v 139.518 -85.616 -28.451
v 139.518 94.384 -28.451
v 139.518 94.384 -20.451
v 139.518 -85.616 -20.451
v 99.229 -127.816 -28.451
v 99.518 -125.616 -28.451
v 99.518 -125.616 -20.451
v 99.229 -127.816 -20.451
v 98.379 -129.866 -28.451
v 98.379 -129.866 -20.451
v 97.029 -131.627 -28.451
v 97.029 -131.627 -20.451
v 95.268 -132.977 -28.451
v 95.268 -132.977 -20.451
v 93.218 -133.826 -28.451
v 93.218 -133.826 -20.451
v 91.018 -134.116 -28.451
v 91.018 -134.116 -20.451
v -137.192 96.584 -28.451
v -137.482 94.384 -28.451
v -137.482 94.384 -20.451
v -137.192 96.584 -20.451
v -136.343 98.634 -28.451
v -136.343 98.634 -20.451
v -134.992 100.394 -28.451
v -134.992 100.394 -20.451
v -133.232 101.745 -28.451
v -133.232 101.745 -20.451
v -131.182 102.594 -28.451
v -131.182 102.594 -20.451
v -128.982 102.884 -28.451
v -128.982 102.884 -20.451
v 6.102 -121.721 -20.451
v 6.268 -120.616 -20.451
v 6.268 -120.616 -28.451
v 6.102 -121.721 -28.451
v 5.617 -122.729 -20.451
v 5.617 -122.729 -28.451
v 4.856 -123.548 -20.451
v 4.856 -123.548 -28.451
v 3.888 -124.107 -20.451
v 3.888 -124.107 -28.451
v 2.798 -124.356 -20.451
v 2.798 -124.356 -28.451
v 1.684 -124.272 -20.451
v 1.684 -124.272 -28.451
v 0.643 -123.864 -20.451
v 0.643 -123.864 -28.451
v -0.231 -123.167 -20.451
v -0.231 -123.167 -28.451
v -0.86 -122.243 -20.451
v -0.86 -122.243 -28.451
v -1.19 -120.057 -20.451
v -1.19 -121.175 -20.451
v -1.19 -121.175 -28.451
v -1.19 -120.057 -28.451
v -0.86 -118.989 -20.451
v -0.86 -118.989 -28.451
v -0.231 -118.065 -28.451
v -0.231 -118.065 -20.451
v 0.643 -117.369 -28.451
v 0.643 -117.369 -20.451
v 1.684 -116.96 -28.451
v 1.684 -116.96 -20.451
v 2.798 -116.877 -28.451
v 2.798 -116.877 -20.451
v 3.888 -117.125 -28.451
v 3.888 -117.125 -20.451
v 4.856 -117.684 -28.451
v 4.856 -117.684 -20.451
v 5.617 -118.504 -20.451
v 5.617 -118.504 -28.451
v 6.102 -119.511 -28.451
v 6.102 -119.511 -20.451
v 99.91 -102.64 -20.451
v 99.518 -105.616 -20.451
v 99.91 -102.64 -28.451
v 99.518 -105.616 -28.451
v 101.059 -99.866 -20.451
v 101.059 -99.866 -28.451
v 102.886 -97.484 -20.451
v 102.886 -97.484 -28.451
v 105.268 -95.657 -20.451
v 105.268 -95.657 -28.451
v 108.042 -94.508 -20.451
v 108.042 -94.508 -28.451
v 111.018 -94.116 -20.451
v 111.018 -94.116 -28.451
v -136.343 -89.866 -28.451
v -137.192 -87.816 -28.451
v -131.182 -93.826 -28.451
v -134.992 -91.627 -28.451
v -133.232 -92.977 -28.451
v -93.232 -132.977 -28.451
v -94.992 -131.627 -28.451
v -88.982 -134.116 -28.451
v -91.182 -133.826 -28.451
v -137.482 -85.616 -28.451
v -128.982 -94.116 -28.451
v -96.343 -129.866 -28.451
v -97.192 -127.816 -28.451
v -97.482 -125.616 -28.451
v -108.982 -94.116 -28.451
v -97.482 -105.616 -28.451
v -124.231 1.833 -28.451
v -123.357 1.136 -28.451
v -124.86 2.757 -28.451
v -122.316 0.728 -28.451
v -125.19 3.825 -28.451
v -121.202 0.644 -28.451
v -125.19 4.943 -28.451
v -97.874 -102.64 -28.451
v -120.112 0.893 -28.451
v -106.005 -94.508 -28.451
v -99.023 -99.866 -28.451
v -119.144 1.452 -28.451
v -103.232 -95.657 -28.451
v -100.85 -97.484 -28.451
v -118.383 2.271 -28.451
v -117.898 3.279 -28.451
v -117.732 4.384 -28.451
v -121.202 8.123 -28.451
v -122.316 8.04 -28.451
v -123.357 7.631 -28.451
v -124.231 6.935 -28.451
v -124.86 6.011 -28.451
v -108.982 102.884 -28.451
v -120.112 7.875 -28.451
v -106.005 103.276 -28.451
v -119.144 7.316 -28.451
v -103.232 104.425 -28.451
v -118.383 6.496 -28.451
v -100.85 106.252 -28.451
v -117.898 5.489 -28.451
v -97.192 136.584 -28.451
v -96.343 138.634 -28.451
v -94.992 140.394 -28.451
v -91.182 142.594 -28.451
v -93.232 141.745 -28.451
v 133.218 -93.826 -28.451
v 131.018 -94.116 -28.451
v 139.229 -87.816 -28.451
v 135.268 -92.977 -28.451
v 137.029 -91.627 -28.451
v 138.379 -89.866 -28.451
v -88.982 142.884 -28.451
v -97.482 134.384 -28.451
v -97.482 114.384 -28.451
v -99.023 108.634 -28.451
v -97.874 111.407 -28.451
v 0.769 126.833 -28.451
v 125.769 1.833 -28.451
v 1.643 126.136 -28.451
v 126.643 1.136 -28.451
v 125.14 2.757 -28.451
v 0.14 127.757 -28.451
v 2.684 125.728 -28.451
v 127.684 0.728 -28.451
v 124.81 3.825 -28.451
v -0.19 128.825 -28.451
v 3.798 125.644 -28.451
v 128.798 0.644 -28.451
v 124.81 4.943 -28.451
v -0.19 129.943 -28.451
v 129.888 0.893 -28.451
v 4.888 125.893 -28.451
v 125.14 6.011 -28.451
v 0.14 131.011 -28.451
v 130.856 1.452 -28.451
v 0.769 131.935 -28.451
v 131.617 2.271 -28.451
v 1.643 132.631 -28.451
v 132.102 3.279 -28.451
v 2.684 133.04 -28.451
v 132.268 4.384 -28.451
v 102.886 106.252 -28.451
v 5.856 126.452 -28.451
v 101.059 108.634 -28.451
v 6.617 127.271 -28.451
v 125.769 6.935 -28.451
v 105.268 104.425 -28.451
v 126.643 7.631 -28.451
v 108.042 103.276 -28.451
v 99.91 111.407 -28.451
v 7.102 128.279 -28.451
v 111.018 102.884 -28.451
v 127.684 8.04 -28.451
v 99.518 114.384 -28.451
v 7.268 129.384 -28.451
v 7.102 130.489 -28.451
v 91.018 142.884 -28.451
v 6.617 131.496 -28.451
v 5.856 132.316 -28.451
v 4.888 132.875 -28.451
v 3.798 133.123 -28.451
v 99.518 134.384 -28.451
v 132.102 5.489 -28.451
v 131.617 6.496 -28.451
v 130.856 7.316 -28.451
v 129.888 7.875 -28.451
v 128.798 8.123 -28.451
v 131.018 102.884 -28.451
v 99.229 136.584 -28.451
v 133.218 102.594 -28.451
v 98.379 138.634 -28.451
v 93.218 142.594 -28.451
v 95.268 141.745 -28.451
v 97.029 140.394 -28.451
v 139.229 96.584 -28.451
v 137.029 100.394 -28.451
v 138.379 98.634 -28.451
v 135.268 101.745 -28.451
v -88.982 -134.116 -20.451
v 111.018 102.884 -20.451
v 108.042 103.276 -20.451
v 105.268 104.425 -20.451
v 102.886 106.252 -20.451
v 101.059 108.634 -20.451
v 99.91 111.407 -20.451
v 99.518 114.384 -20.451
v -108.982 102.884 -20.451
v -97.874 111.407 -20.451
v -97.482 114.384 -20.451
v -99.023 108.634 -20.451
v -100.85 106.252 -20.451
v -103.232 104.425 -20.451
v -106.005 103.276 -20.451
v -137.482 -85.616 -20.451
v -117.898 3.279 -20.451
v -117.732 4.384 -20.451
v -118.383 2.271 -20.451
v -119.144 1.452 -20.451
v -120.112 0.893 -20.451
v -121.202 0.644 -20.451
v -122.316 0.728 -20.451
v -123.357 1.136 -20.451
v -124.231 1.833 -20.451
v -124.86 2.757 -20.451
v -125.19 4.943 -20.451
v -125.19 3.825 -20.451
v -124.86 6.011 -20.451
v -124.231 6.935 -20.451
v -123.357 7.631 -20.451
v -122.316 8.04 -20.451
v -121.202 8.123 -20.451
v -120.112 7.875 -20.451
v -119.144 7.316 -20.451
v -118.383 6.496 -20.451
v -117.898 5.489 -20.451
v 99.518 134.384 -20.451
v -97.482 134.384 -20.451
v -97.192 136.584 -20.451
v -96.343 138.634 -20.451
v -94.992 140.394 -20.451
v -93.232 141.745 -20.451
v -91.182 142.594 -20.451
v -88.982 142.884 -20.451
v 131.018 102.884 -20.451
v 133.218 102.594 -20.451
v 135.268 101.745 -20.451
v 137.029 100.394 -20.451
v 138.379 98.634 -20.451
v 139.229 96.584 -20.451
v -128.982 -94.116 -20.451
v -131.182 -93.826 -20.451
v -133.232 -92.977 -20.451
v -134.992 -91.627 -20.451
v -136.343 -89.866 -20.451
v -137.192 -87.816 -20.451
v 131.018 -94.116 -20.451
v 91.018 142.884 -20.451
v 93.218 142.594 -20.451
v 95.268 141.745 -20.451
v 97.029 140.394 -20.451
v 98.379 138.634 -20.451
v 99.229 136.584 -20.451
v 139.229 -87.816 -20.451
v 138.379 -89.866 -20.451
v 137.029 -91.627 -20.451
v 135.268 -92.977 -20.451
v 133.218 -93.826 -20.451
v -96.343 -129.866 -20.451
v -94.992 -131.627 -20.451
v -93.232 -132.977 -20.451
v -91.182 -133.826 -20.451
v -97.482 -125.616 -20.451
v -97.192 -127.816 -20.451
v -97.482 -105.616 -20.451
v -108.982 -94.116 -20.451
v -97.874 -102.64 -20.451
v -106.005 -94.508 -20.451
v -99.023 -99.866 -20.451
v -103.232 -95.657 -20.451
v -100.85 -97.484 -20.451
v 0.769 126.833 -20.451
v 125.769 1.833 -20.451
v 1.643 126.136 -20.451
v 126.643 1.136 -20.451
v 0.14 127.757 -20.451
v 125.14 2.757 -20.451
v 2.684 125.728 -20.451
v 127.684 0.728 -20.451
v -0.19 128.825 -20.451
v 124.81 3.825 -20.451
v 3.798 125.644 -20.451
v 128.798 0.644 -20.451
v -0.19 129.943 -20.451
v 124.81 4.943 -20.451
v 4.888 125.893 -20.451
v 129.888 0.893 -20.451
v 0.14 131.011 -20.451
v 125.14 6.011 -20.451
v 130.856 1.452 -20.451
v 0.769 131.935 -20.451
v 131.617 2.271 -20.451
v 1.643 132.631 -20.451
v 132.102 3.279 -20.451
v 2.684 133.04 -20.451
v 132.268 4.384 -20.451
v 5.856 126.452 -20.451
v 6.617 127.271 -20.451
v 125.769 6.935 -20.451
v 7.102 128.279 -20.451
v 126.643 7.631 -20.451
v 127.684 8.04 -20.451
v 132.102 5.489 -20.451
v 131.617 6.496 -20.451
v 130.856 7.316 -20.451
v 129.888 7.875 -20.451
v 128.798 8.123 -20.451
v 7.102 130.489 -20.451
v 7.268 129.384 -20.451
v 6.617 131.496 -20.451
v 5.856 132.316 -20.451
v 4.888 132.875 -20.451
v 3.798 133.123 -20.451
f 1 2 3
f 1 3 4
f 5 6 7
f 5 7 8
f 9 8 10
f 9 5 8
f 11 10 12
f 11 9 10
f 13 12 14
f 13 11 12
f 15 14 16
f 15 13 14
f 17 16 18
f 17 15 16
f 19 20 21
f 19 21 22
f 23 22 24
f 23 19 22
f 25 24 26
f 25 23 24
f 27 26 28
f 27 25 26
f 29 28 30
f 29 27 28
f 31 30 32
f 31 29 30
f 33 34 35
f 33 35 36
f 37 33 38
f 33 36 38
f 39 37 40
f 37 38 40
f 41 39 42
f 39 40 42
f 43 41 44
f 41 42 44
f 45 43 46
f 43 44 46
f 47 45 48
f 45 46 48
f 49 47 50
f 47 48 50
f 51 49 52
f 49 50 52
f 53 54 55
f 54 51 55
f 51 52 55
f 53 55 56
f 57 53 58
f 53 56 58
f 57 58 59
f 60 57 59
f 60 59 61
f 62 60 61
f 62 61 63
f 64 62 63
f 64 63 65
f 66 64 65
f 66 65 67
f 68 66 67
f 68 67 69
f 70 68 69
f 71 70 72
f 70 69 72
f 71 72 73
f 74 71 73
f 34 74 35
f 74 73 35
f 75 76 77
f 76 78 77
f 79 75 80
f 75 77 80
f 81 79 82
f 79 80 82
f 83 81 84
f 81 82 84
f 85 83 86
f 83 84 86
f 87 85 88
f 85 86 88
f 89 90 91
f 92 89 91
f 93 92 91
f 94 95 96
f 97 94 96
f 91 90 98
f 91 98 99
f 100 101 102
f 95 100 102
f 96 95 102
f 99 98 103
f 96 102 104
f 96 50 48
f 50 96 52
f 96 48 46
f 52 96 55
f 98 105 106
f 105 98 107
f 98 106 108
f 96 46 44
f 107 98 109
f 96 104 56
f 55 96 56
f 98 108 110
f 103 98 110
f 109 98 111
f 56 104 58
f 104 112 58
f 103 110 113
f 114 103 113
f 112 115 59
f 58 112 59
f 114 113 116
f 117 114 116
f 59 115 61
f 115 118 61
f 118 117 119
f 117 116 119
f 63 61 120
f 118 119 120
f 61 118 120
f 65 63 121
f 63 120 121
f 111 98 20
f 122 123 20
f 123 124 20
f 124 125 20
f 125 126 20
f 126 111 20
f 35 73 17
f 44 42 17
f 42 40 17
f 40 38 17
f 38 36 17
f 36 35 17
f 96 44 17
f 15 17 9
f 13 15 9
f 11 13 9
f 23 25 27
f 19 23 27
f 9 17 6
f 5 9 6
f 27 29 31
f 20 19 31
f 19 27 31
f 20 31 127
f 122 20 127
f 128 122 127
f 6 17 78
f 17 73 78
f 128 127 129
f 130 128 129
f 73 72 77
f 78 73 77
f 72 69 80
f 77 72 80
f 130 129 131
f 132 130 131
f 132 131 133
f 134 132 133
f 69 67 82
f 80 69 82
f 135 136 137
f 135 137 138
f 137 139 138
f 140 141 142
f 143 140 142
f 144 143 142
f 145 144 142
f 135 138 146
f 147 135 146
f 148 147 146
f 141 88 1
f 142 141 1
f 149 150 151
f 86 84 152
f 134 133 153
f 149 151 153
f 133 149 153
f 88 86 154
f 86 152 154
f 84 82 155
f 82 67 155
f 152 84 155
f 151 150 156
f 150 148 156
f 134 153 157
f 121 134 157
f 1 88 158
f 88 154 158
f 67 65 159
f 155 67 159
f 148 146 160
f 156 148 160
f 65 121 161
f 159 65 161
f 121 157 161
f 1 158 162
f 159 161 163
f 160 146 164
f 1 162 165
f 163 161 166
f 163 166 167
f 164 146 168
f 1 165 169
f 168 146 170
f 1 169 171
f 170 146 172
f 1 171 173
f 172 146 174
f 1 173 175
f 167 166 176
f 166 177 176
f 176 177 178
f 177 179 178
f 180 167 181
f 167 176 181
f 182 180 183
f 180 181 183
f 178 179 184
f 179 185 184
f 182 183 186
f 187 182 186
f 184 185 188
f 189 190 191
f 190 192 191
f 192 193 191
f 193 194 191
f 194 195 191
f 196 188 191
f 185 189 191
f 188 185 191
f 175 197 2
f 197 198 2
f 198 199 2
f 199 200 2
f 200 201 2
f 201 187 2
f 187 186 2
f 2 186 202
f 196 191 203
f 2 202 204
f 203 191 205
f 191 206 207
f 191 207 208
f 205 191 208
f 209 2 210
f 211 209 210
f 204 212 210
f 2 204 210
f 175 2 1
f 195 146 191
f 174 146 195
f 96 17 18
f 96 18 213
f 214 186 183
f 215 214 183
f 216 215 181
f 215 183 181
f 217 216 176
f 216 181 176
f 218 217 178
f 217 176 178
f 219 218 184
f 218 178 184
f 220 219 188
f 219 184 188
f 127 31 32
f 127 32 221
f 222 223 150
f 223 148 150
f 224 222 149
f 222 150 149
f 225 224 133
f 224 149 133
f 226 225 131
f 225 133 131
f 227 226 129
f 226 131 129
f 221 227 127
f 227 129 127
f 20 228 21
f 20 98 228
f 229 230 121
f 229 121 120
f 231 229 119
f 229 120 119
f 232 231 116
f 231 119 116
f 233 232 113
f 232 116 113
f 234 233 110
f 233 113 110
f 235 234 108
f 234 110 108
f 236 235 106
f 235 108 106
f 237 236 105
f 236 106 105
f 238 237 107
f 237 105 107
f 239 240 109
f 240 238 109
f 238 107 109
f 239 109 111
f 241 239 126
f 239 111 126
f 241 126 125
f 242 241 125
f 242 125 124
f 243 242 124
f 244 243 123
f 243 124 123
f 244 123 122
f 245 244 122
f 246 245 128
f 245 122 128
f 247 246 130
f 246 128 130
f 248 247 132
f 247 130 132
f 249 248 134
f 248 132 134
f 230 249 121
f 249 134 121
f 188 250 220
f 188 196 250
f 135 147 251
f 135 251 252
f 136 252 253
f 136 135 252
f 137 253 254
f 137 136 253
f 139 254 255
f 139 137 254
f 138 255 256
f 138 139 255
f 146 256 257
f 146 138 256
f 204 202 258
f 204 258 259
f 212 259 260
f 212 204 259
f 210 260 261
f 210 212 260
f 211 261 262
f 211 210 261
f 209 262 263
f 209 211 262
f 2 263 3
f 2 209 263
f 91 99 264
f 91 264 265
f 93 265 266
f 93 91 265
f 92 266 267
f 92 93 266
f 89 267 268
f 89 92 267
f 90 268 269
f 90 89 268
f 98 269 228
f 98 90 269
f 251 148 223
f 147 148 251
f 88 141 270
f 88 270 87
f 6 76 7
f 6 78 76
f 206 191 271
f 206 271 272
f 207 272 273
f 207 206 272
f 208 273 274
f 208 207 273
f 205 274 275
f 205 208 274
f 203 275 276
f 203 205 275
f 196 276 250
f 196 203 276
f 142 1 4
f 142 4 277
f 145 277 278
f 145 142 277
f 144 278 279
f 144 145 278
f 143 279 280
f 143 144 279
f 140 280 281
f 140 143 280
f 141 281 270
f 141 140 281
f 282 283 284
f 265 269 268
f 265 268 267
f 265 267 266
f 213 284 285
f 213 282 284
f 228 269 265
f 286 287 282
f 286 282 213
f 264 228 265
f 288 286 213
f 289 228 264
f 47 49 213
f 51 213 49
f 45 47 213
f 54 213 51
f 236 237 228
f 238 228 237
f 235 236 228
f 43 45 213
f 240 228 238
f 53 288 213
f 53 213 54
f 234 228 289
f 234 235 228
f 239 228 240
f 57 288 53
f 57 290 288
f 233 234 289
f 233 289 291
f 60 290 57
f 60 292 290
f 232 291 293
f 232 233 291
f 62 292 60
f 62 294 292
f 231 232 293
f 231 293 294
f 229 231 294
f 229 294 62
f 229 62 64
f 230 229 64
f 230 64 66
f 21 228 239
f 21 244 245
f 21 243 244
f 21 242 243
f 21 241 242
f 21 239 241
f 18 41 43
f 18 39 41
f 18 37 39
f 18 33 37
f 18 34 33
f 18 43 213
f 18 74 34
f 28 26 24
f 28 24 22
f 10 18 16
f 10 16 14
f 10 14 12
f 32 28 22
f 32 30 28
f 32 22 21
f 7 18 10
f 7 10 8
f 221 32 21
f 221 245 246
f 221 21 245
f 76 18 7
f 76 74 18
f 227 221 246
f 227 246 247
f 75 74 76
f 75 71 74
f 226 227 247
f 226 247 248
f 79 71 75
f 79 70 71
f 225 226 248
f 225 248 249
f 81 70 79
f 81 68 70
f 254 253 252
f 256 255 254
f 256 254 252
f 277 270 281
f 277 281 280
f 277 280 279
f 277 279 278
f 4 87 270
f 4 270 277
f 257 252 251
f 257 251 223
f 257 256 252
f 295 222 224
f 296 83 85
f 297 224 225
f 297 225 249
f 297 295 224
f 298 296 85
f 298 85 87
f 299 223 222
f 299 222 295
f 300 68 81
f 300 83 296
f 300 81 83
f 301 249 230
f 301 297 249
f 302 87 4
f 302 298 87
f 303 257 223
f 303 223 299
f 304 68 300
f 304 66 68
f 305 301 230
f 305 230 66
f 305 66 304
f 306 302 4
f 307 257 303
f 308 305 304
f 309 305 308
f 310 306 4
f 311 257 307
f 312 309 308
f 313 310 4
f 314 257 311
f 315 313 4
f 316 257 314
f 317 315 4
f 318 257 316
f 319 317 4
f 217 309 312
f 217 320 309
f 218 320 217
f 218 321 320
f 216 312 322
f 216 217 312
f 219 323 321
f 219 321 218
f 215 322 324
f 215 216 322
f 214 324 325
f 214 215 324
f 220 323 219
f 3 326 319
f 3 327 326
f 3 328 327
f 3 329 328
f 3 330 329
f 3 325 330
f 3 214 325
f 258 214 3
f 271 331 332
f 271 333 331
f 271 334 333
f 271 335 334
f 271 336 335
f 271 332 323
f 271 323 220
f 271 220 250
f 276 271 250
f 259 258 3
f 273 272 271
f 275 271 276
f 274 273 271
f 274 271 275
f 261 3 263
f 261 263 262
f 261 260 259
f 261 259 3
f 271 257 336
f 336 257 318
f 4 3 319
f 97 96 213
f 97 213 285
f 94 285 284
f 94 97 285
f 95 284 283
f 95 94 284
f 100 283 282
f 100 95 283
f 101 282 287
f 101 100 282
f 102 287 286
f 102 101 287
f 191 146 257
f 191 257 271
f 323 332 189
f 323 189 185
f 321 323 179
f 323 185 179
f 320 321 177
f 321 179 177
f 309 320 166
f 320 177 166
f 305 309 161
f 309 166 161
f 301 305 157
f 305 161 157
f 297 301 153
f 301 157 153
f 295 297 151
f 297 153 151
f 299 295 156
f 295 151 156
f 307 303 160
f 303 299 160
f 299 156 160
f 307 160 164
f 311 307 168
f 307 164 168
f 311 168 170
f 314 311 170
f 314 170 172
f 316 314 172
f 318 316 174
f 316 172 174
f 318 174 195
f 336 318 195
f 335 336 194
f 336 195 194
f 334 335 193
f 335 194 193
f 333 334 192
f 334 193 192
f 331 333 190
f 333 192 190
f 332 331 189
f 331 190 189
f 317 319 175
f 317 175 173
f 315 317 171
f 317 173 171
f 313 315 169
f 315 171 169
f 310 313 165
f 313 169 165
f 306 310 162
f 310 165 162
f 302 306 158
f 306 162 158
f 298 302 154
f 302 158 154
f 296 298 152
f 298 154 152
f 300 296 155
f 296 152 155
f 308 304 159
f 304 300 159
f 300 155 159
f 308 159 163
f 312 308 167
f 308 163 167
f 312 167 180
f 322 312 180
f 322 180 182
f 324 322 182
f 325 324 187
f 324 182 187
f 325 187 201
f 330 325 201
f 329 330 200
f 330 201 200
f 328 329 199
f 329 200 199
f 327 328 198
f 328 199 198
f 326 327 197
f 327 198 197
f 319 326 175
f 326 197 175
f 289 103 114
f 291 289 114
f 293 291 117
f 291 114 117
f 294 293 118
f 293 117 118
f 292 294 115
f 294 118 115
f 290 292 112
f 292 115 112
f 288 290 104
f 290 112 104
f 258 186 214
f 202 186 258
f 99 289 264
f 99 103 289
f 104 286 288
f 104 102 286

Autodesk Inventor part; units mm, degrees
ref_plane "YZ Plane" through (0, 0, 0) normal (1, 0, 0) x (0, 1, 0)
ref_plane "XZ Plane" through (0, 0, 0) normal (0, 1, 0) x (-1, 0, 0)
ref_plane "Work Plane1" through (1.0182, 4.3839, -28.4508) normal (0, 0, 1) x (1, 0, 0)
sketch "Sketch4" plane through (1.0182, 4.3839, -28.4508) normal (0, 0, 1) x (1, 0, 0)
  arc A0 (100, 130) -> (90, 140) centre (90, 130) ccw construction
  line L0 (-90, 140) -> (90, 140) construction
  arc A1 (-90, 140) -> (-100, 130) centre (-90, 130) ccw construction
  line L1 (-100, 110) -> (-100, 130) construction
  arc A2 (-110, 100) -> (-100, 110) centre (-110, 110) ccw construction
  line L2 (-130, 100) -> (-110, 100) construction
  arc A3 (-130, 100) -> (-140, 90) centre (-130, 90) ccw construction
  line L3 (-140, -90) -> (-140, 90) construction
  arc A4 (-140, -90) -> (-130, -100) centre (-130, -90) ccw construction
  line L4 (-110, -100) -> (-130, -100) construction
  arc A5 (-100, -110) -> (-110, -100) centre (-110, -110) ccw construction
  line L5 (-100, -130) -> (-100, -110) construction
  arc A6 (-100, -130) -> (-90, -140) centre (-90, -130) ccw construction
  line L6 (90, -140) -> (-90, -140) construction
  arc A7 (90, -140) -> (100, -130) centre (90, -130) ccw construction
  line L7 (100, -110) -> (100, -130) construction
  arc A8 (110, -100) -> (100, -110) centre (110, -110) ccw construction
  line L8 (130, -100) -> (110, -100) construction
  arc A9 (130, -100) -> (140, -90) centre (130, -90) ccw construction
  line L9 (140, 90) -> (140, -90) construction
  arc A10 (140, 90) -> (130, 100) centre (130, 90) ccw construction
  line L10 (110, 100) -> (130, 100) construction
  arc A11 (100, 110) -> (110, 100) centre (110, 110) ccw construction
  line L11 (100, 130) -> (100, 110) construction
  circle A12 centre (0, 125) radius 3.75 construction
  circle A13 centre (0, -125) radius 3.75 construction
  circle A14 centre (-125, 0) radius 3.75 construction
  circle A15 centre (125, 0) radius 3.75 construction
  arc A16 (98.5, 130) -> (90, 138.5) centre (90, 130) ccw
  line L12 (98.5, 130) -> (98.5, 110)
  arc A17 (98.5, 110) -> (110, 98.5) centre (110, 110) ccw
  line L13 (110, 98.5) -> (130, 98.5)
  arc A18 (138.5, 90) -> (130, 98.5) centre (130, 90) ccw
  line L14 (138.5, 90) -> (138.5, -90)
  arc A19 (130, -98.5) -> (138.5, -90) centre (130, -90) ccw
  line L15 (130, -98.5) -> (110, -98.5)
  arc A20 (110, -98.5) -> (98.5, -110) centre (110, -110) ccw
  line L16 (98.5, -110) -> (98.5, -130)
  arc A21 (90, -138.5) -> (98.5, -130) centre (90, -130) ccw
  line L17 (90, -138.5) -> (-90, -138.5)
  arc A22 (-98.5, -130) -> (-90, -138.5) centre (-90, -130) ccw
  line L18 (-98.5, -130) -> (-98.5, -110)
  arc A23 (-98.5, -110) -> (-110, -98.5) centre (-110, -110) ccw
  line L19 (-110, -98.5) -> (-130, -98.5)
  arc A24 (-138.5, -90) -> (-130, -98.5) centre (-130, -90) ccw
  line L20 (-138.5, -90) -> (-138.5, 90)
  arc A25 (-130, 98.5) -> (-138.5, 90) centre (-130, 90) ccw
  line L21 (-130, 98.5) -> (-110, 98.5)
  arc A26 (-110, 98.5) -> (-98.5, 110) centre (-110, 110) ccw
  line L22 (-98.5, 110) -> (-98.5, 130)
  arc A27 (-90, 138.5) -> (-98.5, 130) centre (-90, 130) ccw
  line L23 (-90, 138.5) -> (90, 138.5)
  line L24 (-125, 0) -> (-113.2017, 0)
  circle A28 centre (2.5, 125) radius 3.75
  circle A29 centre (-122.5, 0) radius 3.75
  circle A30 centre (127.5, 0) radius 3.75
  circle A31 centre (1.5, -125) radius 3.75
  point P0 (-1.0182, -4.3839)
  dimension "d21" = 1.5
  dimension "d22" = 2.5
  dimension "d23" = 2.5
  dimension "d24" = 2.5
  dimension "d25" = 1.5
  dimension "d26" = 7.5
  dimension "d27" = 7.5
  dimension "d28" = 7.5
  dimension "d29" = 7.5
  dimension "d30" = 7.5
extrude "Extrusion3" add sketch "Sketch4" along normal blind 8
sketch "Sketch6" plane through (1.0182, 4.3839, -20.4508) normal (0, 0, 1) x (1, 0, 0)
  arc A0 (98.5, 130) -> (90, 138.5) centre (90, 130) ccw projected
  line L0 (90, 138.5) -> (-90, 138.5) projected
  arc A1 (-90, 138.5) -> (-98.5, 130) centre (-90, 130) ccw projected
  line L1 (-98.5, 130) -> (-98.5, 110) projected
  arc A2 (-110, 98.5) -> (-98.5, 110) centre (-110, 110) ccw projected
  line L2 (-110, 98.5) -> (-130, 98.5) projected
  arc A3 (-130, 98.5) -> (-138.5, 90) centre (-130, 90) ccw projected
  line L3 (-138.5, 90) -> (-138.5, -90) projected
  arc A4 (-138.5, -90) -> (-130, -98.5) centre (-130, -90) ccw projected
  line L4 (-130, -98.5) -> (-110, -98.5) projected
  arc A5 (-98.5, -110) -> (-110, -98.5) centre (-110, -110) ccw projected
  line L5 (-98.5, -110) -> (-98.5, -130) projected
  arc A6 (-98.5, -130) -> (-90, -138.5) centre (-90, -130) ccw projected
  line L6 (-90, -138.5) -> (90, -138.5) projected
  arc A7 (90, -138.5) -> (98.5, -130) centre (90, -130) ccw projected
  line L7 (98.5, -130) -> (98.5, -110) projected
  arc A8 (110, -98.5) -> (98.5, -110) centre (110, -110) ccw projected
  line L8 (110, -98.5) -> (130, -98.5) projected
  arc A9 (130, -98.5) -> (138.5, -90) centre (130, -90) ccw projected
  line L9 (138.5, -90) -> (138.5, 90) projected
  arc A10 (138.5, 90) -> (130, 98.5) centre (130, 90) ccw projected
  line L10 (130, 98.5) -> (110, 98.5) projected
  arc A11 (98.5, 110) -> (110, 98.5) centre (110, 110) ccw projected
  line L11 (98.5, 110) -> (98.5, 130) projected
  circle A12 centre (1.5, -125) radius 3.75 projected
  circle A13 centre (127.5, 0) radius 3.75 projected
  circle A14 centre (-122.5, 0) radius 3.75 projected
  circle A15 centre (2.5, 125) radius 3.75 projected
  point P0 (-1.0182, -4.3839)
equation "\"d27\" = d26"
equation "\"d28\" = d27"
equation "\"d29\" = d28"
equation "\"d30\" = d28"
properties part number "_3DPrint"
